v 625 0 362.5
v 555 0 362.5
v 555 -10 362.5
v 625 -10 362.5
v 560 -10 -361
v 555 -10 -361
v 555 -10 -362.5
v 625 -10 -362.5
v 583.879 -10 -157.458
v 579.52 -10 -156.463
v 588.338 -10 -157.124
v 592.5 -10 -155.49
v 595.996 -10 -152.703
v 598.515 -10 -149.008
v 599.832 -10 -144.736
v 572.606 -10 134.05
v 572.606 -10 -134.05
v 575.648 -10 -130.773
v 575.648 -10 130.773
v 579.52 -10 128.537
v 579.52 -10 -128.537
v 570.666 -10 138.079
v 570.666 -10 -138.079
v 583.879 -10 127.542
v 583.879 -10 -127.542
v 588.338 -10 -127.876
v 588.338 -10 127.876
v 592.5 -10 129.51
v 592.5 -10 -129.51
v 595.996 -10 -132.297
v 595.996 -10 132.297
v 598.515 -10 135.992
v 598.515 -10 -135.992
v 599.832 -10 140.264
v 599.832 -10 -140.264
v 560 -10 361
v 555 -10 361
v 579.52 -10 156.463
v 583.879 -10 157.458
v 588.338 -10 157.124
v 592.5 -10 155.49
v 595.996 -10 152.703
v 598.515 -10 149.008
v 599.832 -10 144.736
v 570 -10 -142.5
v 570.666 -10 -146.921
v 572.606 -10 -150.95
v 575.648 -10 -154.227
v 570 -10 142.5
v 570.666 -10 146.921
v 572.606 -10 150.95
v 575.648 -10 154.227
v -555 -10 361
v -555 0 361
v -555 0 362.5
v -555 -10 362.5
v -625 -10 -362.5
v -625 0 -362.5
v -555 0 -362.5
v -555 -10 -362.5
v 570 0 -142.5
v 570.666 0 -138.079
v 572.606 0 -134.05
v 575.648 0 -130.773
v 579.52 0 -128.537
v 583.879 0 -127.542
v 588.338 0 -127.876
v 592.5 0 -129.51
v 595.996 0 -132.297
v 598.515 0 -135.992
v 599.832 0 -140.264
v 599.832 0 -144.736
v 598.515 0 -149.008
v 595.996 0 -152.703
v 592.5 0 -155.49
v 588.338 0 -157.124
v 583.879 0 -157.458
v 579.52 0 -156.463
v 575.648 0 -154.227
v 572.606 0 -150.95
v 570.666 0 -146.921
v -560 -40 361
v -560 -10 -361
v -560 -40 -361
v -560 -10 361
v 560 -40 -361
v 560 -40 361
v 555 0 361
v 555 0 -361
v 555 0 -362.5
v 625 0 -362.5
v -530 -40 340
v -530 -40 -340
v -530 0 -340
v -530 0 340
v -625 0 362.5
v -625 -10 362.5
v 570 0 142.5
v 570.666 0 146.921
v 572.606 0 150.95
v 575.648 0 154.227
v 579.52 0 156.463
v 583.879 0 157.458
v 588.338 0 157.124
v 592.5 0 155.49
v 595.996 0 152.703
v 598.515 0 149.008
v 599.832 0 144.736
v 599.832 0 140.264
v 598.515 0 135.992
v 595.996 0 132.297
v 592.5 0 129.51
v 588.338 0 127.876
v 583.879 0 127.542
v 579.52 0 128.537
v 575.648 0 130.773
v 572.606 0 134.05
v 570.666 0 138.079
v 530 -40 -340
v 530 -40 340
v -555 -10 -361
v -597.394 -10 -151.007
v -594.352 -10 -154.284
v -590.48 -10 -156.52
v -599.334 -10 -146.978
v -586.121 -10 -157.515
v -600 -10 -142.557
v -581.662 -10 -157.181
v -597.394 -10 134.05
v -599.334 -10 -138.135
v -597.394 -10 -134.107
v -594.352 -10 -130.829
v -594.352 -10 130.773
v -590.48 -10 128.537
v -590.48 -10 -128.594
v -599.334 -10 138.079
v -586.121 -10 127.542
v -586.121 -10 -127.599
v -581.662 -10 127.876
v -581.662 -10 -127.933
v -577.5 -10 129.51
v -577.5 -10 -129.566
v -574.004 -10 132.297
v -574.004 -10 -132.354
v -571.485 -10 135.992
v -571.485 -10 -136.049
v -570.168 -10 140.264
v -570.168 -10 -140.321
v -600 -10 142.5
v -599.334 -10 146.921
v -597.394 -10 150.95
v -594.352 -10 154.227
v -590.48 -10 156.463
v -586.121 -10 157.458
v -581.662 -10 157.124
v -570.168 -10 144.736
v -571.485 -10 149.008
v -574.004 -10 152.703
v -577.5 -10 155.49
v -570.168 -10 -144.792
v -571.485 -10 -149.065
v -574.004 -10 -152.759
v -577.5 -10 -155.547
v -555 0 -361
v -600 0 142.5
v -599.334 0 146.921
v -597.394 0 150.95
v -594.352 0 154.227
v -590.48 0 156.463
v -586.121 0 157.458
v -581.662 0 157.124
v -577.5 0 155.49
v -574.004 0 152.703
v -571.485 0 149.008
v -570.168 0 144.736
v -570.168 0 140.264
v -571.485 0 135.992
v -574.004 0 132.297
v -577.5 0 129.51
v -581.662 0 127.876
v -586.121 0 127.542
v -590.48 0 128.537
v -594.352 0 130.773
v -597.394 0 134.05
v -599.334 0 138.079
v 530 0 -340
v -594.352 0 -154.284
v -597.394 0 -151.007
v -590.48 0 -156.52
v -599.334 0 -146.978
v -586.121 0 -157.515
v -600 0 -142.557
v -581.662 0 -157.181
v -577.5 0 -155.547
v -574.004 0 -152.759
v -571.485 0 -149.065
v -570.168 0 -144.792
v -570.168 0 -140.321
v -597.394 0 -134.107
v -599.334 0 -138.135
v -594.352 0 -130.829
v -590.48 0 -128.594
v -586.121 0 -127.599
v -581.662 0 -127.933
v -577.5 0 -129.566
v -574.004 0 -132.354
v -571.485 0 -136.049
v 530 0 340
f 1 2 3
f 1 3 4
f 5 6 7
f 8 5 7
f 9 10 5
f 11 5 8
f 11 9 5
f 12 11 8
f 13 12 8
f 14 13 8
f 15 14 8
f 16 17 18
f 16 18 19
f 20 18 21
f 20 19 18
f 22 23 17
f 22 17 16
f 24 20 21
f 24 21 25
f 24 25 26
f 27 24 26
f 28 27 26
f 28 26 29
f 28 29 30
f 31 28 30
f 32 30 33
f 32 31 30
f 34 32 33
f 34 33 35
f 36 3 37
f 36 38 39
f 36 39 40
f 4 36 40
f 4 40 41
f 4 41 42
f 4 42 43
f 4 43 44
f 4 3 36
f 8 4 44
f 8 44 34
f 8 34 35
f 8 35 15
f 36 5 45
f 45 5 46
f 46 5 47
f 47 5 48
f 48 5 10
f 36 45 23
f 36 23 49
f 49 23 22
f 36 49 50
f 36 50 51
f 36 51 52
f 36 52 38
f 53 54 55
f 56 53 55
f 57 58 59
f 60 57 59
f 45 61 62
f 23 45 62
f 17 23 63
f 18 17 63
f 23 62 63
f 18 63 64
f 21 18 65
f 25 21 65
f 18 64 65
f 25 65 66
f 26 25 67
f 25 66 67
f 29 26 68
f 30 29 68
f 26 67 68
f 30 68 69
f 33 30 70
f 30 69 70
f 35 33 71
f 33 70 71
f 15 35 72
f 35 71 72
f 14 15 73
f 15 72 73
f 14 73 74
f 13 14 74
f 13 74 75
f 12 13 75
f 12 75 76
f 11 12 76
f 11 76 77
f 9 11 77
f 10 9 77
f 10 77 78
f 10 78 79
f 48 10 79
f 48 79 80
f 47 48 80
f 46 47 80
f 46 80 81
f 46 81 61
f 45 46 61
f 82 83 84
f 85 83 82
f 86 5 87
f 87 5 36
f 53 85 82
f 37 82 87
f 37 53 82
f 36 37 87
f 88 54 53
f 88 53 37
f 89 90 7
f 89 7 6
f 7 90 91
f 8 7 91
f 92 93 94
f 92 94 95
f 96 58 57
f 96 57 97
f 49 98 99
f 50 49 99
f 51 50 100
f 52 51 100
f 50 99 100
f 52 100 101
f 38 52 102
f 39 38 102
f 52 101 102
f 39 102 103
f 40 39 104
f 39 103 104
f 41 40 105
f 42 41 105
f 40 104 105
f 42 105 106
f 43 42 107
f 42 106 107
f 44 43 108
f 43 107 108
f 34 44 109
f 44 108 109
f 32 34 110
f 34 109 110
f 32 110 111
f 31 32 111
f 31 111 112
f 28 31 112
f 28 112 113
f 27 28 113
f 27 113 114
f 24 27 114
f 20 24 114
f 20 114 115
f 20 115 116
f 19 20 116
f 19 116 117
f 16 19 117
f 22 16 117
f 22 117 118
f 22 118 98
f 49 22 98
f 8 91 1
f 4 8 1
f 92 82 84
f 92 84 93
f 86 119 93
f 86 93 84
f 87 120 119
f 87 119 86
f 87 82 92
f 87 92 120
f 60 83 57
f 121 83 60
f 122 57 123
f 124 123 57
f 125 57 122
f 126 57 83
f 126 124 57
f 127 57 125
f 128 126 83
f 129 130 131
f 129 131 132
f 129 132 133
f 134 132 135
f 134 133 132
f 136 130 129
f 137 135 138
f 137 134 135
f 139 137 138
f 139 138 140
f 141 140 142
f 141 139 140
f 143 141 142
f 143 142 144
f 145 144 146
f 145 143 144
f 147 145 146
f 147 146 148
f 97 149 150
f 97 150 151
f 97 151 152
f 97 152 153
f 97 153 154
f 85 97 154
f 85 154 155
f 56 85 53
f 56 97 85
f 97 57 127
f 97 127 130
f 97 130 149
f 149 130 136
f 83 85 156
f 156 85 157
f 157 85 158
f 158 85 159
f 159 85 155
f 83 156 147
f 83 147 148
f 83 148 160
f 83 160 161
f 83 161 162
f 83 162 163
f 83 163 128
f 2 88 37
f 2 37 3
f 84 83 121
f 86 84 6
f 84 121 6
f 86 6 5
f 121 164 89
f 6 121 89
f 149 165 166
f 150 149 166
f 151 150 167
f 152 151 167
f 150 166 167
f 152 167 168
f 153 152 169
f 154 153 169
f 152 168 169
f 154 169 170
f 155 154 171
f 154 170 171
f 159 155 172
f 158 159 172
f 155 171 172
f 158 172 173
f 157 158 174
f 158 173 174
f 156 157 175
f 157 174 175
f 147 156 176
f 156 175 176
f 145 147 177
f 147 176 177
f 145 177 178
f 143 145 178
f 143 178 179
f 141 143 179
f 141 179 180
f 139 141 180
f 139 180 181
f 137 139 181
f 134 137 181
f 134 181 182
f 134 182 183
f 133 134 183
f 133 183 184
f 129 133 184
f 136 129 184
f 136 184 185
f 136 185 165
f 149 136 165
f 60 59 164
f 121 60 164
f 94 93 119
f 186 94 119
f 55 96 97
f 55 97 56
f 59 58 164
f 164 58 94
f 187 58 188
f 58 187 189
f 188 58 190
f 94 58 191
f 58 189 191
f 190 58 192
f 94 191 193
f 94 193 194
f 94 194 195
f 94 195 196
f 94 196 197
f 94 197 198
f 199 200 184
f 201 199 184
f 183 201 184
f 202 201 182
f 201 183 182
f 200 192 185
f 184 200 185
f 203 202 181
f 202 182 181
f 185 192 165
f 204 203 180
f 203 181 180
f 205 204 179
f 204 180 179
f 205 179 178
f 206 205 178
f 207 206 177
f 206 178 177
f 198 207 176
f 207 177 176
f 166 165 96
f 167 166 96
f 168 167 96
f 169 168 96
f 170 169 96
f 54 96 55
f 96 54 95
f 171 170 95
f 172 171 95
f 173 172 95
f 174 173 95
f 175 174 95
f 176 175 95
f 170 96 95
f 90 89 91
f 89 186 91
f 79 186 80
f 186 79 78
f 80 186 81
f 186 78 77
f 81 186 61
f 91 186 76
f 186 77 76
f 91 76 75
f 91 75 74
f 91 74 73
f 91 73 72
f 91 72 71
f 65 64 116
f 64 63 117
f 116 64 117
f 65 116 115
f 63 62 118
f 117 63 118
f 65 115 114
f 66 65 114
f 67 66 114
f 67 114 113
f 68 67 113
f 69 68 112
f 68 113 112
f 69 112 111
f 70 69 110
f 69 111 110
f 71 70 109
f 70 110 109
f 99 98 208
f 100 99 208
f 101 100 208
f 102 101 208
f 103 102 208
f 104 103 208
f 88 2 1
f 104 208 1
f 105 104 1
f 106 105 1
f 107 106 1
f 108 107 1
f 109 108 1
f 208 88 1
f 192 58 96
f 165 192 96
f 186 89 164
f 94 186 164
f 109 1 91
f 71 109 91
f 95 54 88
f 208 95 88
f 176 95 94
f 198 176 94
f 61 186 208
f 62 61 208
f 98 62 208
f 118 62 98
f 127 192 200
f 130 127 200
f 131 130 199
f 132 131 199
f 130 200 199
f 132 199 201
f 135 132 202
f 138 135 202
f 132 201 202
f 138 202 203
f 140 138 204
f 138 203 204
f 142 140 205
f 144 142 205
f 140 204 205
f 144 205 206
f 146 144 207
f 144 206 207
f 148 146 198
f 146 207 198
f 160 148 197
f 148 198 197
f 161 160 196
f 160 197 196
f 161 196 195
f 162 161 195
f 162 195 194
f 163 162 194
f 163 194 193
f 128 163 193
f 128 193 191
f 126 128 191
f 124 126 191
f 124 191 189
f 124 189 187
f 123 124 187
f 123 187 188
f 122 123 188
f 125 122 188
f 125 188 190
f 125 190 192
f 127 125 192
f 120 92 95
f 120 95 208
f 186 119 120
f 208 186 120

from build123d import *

# Parameters (mm, degrees)
F0_W      = 1120
F0_H      = 722
F1_DEPTH  = 40
F2_W      = 70
F2_H      = 725
F3_DEPTH  = 10
F5_D      = 30
F7_D      = 30
F8_W      = 70
F8_H      = 725
F9_DEPTH  = 10
F11_D     = 30
F12_W     = 1060
F12_H     = 680
F13_DEPTH = 40.001


with BuildPart() as f1:
    # F0 (on Front) → F1 (new body)
    with BuildSketch(Plane.XZ):
        Rectangle(F0_W, F0_H)
    extrude(amount=F1_DEPTH)

    # F2 (on Front) → F3 (join)
    with BuildSketch(Plane.XZ):
        with Locations((590, 0)):
            Rectangle(F2_W, F2_H)
    extrude(amount=F3_DEPTH)

    # F5 (through all)
    with Locations(Plane.XZ.offset(10)):
        with Locations((585, 142.5)):
            Hole(F5_D / 2)

    # F7 (through all)
    with Locations(Plane.XZ.offset(10)):
        with Locations((585, -142.5)):
            Hole(F7_D / 2)

    # F8 (on Front) → F9 (join)
    with BuildSketch(Plane.XZ):
        with Locations((-590, 0)):
            Rectangle(F8_W, F8_H)
    extrude(amount=F9_DEPTH)

    # F11 (through all)
    with Locations(Plane.XZ.offset(10)):
        with Locations((-585, 142.5), (-585, -142.556826)):
            Hole(F11_D / 2)

    # F12 (on face) → F13 (cut, through all)
    with BuildSketch(Plane.XZ.offset(40)):
        Rectangle(F12_W, F12_H)
    extrude(amount=-F13_DEPTH, mode=Mode.SUBTRACT)


solid = f1.part
